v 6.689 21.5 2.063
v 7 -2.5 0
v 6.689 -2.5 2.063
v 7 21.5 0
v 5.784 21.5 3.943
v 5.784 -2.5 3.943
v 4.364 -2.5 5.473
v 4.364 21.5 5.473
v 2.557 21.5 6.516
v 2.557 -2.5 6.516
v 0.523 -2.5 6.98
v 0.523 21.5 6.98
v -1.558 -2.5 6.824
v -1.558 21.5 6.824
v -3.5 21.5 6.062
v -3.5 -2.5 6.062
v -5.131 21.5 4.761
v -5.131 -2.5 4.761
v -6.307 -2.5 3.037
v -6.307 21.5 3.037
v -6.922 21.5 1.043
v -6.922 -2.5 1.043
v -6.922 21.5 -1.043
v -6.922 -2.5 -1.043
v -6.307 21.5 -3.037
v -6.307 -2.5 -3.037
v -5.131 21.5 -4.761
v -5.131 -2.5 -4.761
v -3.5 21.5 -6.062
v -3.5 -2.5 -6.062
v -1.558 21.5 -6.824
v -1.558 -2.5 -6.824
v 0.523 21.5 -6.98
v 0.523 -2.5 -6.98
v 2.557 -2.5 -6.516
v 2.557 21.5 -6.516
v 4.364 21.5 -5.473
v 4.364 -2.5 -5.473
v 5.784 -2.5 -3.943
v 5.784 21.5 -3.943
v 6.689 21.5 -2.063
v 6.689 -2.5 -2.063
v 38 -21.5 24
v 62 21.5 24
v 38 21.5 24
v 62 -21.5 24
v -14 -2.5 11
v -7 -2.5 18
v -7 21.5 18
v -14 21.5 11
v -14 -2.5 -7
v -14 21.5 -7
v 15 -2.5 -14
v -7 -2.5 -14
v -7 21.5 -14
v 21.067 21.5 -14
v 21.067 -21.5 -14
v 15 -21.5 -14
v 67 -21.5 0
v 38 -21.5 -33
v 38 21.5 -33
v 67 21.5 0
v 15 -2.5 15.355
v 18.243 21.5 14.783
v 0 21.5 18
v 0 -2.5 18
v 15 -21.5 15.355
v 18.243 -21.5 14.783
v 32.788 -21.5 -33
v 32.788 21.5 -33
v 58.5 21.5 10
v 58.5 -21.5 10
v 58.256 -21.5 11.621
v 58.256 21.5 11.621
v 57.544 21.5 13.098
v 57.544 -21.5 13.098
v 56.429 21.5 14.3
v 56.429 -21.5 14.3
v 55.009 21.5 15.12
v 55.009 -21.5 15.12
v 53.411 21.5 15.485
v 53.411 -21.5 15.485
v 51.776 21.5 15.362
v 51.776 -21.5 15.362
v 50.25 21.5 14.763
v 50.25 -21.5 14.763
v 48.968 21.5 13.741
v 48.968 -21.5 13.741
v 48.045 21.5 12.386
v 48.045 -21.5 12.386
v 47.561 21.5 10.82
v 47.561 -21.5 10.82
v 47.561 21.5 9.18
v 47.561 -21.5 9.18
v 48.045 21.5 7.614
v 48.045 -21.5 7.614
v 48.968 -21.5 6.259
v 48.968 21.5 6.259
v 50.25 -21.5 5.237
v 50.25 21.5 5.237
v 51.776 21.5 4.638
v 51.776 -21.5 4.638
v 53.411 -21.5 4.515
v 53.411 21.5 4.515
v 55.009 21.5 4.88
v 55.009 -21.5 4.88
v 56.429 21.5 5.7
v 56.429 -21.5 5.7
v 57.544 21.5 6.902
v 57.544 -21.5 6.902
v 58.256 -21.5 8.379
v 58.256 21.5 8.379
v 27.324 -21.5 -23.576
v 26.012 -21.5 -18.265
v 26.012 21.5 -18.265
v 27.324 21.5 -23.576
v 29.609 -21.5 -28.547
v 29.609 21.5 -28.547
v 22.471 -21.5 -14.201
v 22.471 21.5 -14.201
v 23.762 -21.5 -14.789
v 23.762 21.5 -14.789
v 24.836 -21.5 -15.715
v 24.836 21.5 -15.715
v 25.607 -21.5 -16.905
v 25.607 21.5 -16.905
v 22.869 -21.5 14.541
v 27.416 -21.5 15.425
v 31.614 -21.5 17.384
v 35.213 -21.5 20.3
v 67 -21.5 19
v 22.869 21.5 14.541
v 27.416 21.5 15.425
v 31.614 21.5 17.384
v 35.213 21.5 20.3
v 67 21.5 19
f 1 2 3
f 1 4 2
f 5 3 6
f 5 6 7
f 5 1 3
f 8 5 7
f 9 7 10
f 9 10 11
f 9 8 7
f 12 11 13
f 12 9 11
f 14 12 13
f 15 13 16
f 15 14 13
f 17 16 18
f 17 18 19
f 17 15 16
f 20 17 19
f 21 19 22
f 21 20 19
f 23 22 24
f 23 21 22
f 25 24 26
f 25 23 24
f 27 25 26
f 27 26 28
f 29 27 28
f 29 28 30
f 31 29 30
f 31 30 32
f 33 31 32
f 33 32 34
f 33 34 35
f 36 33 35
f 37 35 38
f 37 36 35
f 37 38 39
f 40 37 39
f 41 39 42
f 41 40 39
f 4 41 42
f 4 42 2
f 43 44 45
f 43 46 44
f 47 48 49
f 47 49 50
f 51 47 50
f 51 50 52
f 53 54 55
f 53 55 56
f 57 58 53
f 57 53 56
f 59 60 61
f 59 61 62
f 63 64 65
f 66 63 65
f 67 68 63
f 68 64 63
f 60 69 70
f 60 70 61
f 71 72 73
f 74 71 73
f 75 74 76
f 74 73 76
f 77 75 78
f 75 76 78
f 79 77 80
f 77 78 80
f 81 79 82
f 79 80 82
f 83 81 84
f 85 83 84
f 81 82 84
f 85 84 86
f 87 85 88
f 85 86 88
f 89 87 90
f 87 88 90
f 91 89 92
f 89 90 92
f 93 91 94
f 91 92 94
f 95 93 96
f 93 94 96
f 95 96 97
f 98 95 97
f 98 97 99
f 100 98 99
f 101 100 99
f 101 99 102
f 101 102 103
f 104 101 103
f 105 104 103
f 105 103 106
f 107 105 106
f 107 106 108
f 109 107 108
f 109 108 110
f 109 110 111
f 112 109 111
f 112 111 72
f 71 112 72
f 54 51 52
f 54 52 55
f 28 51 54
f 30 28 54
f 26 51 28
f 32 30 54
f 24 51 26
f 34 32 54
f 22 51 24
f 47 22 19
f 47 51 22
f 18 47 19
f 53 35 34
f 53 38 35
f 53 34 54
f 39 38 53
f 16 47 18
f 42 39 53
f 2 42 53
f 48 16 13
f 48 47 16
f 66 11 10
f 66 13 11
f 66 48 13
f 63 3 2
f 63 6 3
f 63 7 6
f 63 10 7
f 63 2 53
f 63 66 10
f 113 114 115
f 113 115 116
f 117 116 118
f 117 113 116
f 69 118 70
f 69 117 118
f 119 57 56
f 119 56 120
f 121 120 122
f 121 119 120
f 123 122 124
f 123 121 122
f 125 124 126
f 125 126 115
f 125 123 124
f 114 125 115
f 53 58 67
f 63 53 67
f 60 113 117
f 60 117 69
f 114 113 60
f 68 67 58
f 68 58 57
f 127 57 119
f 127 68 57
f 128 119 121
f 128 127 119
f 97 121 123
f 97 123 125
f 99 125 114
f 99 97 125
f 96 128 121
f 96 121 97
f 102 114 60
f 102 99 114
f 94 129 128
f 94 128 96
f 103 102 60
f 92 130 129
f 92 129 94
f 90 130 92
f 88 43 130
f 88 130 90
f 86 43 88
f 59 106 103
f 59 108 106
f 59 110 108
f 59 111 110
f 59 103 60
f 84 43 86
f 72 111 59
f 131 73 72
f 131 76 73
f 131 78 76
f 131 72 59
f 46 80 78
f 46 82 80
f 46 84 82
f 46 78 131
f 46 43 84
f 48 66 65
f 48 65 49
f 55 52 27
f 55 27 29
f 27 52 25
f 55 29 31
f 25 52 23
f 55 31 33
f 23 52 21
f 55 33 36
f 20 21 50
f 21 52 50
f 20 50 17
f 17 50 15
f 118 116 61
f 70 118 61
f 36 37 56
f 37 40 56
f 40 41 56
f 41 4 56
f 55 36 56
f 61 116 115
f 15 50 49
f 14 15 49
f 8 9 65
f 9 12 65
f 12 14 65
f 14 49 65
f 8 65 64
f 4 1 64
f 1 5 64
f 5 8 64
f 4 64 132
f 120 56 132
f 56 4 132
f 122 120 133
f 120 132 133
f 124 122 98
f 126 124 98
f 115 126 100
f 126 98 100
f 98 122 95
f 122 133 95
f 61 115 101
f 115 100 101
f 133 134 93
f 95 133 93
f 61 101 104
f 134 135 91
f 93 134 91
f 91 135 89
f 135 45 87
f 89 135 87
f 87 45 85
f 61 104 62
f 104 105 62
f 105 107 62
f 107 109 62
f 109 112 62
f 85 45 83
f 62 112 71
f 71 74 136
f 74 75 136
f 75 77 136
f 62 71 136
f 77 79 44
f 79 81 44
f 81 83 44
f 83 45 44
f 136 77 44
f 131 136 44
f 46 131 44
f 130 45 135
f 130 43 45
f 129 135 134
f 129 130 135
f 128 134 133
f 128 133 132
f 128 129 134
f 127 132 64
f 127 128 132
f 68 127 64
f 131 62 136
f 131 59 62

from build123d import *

# Parameters (mm, degrees)
F0_R     = 7
F1_DEPTH = 21.5
F2_R     = 5.5
F3_DEPTH = 43.001
F2_R_2   = 7
F4_DEPTH = 19


with BuildPart() as f1:
    # F0 (on Front) → F1 (new body, symmetric)
    with BuildSketch(Plane.XZ):
        with BuildLine():
            Line((-7, 18), (-14, 11))
            Line((-14, 11), (-14, -7))
            Line((-14, -7), (-7, -14))
            Line((-7, -14), (21.0666262554, -14))
            ThreePointArc((21.0666262554, -14), (24.3318620364, -15.2134137678), (26.0122649968, -18.2647058824))
            ThreePointArc((26.0122649968, -18.2647058824), (28.3490951999, -26.115672061), (32.7880673968, -33))
            Line((32.7880673968, -33), (38, -33))
            Line((38, -33), (67, 0))
            Line((67, 0), (67, 19))
            Line((67, 19), (62, 24))
            Line((62, 24), (38, 24))
            ThreePointArc((38, 24), (29.5749729609, 16.2760691513), (18.2430849879, 14.7832519053))
            Line((18.2430849879, 14.7832519053), (0, 18))
            Line((0, 18), (-7, 18))
        make_face()
        Circle(F0_R, mode=Mode.SUBTRACT)
    extrude(amount=F1_DEPTH, both=True)

    # F2 (on face) → F3 (cut, through all)
    with BuildSketch(Plane.XZ.offset(21.5)):
        with Locations((53, 10)):
            Circle(F2_R)
    extrude(amount=-F3_DEPTH, mode=Mode.SUBTRACT)

    # F2 (on face) → F4 (cut)
    with BuildSketch(Plane.XZ.offset(21.5)):
        Polygon((15, -14), (15, 15.3550952894), (0, 18), (-7, 18), (-14, 11), (-14, -7), (-7, -14), align=None)
        Circle(F2_R_2, mode=Mode.SUBTRACT)
    extrude(amount=-F4_DEPTH, mode=Mode.SUBTRACT)


solid = f1.part
